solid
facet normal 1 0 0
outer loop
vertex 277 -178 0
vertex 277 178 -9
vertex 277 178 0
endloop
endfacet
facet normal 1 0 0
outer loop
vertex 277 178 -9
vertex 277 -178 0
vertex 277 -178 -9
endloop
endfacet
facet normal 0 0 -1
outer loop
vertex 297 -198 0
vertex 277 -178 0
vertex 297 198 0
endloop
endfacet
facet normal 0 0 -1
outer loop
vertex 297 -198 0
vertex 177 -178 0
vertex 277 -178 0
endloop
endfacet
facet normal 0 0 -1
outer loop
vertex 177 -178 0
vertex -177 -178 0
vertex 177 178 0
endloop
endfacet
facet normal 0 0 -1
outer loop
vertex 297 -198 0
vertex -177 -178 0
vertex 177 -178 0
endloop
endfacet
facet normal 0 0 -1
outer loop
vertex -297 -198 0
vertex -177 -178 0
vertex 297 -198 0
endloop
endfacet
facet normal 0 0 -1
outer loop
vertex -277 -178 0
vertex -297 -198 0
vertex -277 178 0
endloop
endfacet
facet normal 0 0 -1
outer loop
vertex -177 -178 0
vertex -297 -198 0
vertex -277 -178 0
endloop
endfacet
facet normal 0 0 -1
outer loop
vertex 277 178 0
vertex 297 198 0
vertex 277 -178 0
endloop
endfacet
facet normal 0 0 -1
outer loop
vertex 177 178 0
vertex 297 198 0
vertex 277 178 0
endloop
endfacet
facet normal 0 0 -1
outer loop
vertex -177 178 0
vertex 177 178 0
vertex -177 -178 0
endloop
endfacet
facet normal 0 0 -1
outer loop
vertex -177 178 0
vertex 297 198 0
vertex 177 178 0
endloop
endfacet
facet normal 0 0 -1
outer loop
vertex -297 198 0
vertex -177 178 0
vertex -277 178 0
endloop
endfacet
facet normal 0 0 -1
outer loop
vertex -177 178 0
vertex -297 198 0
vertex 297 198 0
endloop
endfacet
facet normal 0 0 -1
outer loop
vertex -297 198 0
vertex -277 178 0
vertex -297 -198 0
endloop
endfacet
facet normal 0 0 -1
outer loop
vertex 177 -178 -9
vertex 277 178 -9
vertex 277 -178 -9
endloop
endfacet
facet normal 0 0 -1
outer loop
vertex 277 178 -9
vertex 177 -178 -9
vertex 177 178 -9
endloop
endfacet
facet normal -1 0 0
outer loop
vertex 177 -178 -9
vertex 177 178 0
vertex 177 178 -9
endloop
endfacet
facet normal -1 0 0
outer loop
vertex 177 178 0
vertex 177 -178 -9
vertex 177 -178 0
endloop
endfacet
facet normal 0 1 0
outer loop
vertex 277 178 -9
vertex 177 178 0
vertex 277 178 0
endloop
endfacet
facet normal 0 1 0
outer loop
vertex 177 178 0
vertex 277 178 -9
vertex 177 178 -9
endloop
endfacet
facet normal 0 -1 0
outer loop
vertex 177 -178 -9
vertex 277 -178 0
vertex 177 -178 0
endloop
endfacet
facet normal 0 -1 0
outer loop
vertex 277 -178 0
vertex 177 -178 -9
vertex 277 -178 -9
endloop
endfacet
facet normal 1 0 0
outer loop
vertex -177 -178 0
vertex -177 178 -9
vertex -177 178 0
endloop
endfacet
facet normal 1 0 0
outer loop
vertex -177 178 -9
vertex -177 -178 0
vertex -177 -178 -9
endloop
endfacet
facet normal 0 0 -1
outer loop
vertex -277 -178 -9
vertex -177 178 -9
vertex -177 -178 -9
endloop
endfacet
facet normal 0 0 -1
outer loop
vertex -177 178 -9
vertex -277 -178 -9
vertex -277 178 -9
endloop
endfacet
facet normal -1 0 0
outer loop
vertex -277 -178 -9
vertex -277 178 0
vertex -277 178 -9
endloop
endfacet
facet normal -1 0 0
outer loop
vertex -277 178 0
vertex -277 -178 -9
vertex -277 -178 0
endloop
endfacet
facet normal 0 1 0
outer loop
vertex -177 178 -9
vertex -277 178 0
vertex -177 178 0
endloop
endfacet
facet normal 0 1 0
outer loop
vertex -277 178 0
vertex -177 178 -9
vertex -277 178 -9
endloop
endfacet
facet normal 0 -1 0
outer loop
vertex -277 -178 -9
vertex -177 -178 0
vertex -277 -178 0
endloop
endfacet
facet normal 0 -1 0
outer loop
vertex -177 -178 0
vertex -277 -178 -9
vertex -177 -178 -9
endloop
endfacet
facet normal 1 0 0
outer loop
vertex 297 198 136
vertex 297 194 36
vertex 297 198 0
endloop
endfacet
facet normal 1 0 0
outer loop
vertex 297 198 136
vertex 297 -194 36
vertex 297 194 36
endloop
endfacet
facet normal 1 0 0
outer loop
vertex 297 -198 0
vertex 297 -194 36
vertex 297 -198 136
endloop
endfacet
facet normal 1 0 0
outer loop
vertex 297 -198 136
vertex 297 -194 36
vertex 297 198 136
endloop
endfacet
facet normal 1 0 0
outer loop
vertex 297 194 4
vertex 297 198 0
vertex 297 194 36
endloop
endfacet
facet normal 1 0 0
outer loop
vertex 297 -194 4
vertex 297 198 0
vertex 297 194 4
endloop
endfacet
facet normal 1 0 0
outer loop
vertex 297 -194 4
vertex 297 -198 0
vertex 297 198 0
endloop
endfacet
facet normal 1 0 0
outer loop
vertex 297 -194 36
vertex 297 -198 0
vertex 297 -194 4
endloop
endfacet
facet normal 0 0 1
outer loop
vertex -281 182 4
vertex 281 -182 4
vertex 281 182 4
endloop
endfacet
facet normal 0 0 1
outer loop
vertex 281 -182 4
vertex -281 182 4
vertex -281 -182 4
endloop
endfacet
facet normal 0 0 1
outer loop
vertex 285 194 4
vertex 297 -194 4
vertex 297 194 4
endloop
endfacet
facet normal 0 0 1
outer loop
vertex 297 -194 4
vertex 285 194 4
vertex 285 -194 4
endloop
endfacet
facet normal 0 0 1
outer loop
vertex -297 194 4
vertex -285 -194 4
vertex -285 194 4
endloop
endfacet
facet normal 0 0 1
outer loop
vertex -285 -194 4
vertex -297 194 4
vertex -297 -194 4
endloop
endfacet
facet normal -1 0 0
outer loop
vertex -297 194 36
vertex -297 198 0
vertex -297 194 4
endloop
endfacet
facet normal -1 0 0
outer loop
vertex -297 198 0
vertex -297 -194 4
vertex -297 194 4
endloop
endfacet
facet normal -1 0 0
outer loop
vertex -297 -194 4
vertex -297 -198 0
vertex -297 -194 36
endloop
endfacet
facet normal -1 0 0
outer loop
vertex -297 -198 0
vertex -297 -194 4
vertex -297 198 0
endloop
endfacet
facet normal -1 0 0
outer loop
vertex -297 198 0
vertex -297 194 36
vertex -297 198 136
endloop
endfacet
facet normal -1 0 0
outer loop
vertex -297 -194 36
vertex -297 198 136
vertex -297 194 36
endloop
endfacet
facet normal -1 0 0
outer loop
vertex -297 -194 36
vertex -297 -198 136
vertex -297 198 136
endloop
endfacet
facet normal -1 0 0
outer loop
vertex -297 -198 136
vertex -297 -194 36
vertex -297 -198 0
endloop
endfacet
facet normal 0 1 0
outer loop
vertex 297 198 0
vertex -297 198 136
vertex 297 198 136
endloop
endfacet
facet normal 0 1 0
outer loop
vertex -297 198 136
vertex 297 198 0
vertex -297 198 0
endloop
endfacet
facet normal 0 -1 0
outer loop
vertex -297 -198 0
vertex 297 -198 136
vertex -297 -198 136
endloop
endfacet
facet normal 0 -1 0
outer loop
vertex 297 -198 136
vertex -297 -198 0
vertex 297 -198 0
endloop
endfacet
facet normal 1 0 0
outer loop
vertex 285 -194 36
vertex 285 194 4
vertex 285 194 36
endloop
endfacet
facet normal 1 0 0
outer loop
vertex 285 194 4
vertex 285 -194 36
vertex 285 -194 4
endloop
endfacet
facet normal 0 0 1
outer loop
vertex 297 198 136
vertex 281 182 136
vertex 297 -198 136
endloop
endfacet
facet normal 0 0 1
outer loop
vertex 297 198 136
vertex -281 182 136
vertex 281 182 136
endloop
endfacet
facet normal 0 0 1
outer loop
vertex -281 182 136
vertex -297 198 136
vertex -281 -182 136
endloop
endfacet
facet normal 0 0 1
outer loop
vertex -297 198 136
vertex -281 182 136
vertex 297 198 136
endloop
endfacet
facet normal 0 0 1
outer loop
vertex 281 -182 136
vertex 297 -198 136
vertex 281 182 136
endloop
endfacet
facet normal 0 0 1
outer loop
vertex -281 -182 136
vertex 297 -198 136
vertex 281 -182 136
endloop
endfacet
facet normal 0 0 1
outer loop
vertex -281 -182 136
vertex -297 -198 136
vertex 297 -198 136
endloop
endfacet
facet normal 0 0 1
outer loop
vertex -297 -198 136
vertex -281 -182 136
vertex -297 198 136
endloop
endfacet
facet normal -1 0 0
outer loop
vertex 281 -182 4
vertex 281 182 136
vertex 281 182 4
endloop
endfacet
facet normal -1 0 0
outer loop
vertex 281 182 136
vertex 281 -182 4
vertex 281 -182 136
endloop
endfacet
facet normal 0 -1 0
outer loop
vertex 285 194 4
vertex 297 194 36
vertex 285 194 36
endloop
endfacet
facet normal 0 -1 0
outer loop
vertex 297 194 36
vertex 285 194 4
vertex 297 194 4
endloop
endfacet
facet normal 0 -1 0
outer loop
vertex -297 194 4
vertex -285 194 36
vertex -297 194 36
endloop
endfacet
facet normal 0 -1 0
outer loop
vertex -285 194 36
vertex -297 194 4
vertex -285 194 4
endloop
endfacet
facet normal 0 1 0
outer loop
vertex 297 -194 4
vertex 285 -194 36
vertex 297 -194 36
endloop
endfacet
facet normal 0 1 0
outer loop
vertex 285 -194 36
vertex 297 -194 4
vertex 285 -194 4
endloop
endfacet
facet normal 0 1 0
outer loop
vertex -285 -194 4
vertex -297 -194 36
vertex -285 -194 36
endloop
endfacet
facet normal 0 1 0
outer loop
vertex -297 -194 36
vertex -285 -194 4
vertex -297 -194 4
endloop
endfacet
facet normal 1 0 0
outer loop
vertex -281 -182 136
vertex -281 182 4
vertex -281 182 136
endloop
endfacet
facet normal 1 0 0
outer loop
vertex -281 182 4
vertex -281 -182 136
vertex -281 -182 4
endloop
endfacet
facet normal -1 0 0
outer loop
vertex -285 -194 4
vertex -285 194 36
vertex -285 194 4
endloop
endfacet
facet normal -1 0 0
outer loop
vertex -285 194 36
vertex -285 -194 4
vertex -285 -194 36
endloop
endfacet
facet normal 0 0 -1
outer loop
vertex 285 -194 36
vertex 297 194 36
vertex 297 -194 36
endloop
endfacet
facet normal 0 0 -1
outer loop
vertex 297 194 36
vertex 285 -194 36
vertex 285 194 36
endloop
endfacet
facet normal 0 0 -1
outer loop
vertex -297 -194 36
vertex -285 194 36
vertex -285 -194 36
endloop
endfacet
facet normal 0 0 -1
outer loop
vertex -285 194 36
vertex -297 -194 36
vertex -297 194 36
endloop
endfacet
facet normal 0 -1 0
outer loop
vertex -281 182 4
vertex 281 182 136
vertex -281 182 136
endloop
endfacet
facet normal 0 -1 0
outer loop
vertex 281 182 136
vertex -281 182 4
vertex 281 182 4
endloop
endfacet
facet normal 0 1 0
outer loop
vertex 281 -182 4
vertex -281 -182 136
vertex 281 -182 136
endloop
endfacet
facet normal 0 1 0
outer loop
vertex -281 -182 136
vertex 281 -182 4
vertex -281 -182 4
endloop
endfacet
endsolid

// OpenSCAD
plywood_4mm = 4;
plywood_9mm = 9;
plywood_12mm = 12;

//measurements
//eb_length = 598;
//eb_width = 398;
//eb_height_inner = 130; 
//eb_in_out_diff = 18;

//https://en.wikipedia.org/wiki/Euro_container
eb_length = 594;
eb_width = 396;
//eb_height_inner = 132.5; 
eb_height_inner = 132; 
//eb_height_inner = 167; 

eb_in_out_diff = 20;

min_cut_width = 100;

//----------------------

plate_thickness = plywood_4mm;
eb_height_stacked = eb_height_inner + plate_thickness;
echo("eb_height_inner", eb_height_inner);
echo("eb_height_stacked", eb_height_stacked);

//----------------------
// 2x footer
//----------------------
footer_single_size = [min_cut_width, eb_width-2*eb_in_out_diff, plywood_9mm];

o_footer_x = (eb_length/2) - (min_cut_width/2) - eb_in_out_diff;
o_footer_z = plywood_9mm/2;

translate([o_footer_x, 0, -o_footer_z])
    cube(footer_single_size, center = true);
translate([-o_footer_x, 0, -o_footer_z])
    cube(footer_single_size, center = true);
echo("footer:");
echo("2x", footer_single_size);

//----------------------
// 1x plate
//----------------------

o_plate_z = plate_thickness/2;
translate([0, 0, o_plate_z])
    cube([eb_length, eb_width, plate_thickness], center = true);
echo("plate:");
echo("1x", [eb_length, eb_width, plate_thickness]);

//----------------------
// 8x sides
//----------------------
sides_hight = (eb_height_inner/2) + plate_thickness;
side_short_length = eb_width - 2 * plywood_4mm;

// sides-short-thin
o_short_x = eb_length/2-plywood_4mm/2-plywood_12mm;

translate([o_short_x, 0, sides_hight])
    cube([plywood_4mm, side_short_length, eb_height_inner], center = true);
translate([-(o_short_x), 0, sides_hight])
    cube([plywood_4mm, side_short_length, eb_height_inner], center = true);
echo("sides-short-thin:");
echo("2x", [plywood_4mm, side_short_length, eb_height_inner]);

// sides-short-thick
o_short_T_z = eb_length/2-plywood_12mm/2;
o_short_T_z_grip = (eb_height_inner - min_cut_width)/2;

translate([o_short_T_z, 0, sides_hight + o_short_T_z_grip])
    cube([plywood_12mm, side_short_length, min_cut_width], center = true);
translate([-(o_short_T_z), 0, sides_hight + o_short_T_z_grip])
    cube([plywood_12mm, side_short_length, min_cut_width], center = true);
echo("sides-short-thick:");
echo("2x", [plywood_12mm, side_short_length, min_cut_width]);

// sides-long-thin
o_long_y = eb_width/2 - plywood_4mm/2;
o_long_thick_y = eb_width/2 - plywood_12mm/2 - plywood_4mm;
side_long_length = eb_length - 2 * plywood_12mm - 2 * plywood_4mm;

translate([0, o_long_y, sides_hight])
    cube([eb_length, plywood_4mm, eb_height_inner], center = true);
translate([0, -o_long_y, sides_hight])
    cube([eb_length, plywood_4mm, eb_height_inner], center = true);
echo("sides-long-thin:");
echo("2x", [eb_length, plywood_4mm, eb_height_inner]);


// sides-long-thick
translate([0, o_long_thick_y, sides_hight])
    cube([side_long_length, plywood_12mm, eb_height_inner], center = true);
translate([0, -o_long_thick_y, sides_hight])
    cube([side_long_length, plywood_12mm, eb_height_inner], center = true);
echo("sides-long-thick:");
echo("2x", [side_long_length, plywood_12mm, eb_height_inner]);
